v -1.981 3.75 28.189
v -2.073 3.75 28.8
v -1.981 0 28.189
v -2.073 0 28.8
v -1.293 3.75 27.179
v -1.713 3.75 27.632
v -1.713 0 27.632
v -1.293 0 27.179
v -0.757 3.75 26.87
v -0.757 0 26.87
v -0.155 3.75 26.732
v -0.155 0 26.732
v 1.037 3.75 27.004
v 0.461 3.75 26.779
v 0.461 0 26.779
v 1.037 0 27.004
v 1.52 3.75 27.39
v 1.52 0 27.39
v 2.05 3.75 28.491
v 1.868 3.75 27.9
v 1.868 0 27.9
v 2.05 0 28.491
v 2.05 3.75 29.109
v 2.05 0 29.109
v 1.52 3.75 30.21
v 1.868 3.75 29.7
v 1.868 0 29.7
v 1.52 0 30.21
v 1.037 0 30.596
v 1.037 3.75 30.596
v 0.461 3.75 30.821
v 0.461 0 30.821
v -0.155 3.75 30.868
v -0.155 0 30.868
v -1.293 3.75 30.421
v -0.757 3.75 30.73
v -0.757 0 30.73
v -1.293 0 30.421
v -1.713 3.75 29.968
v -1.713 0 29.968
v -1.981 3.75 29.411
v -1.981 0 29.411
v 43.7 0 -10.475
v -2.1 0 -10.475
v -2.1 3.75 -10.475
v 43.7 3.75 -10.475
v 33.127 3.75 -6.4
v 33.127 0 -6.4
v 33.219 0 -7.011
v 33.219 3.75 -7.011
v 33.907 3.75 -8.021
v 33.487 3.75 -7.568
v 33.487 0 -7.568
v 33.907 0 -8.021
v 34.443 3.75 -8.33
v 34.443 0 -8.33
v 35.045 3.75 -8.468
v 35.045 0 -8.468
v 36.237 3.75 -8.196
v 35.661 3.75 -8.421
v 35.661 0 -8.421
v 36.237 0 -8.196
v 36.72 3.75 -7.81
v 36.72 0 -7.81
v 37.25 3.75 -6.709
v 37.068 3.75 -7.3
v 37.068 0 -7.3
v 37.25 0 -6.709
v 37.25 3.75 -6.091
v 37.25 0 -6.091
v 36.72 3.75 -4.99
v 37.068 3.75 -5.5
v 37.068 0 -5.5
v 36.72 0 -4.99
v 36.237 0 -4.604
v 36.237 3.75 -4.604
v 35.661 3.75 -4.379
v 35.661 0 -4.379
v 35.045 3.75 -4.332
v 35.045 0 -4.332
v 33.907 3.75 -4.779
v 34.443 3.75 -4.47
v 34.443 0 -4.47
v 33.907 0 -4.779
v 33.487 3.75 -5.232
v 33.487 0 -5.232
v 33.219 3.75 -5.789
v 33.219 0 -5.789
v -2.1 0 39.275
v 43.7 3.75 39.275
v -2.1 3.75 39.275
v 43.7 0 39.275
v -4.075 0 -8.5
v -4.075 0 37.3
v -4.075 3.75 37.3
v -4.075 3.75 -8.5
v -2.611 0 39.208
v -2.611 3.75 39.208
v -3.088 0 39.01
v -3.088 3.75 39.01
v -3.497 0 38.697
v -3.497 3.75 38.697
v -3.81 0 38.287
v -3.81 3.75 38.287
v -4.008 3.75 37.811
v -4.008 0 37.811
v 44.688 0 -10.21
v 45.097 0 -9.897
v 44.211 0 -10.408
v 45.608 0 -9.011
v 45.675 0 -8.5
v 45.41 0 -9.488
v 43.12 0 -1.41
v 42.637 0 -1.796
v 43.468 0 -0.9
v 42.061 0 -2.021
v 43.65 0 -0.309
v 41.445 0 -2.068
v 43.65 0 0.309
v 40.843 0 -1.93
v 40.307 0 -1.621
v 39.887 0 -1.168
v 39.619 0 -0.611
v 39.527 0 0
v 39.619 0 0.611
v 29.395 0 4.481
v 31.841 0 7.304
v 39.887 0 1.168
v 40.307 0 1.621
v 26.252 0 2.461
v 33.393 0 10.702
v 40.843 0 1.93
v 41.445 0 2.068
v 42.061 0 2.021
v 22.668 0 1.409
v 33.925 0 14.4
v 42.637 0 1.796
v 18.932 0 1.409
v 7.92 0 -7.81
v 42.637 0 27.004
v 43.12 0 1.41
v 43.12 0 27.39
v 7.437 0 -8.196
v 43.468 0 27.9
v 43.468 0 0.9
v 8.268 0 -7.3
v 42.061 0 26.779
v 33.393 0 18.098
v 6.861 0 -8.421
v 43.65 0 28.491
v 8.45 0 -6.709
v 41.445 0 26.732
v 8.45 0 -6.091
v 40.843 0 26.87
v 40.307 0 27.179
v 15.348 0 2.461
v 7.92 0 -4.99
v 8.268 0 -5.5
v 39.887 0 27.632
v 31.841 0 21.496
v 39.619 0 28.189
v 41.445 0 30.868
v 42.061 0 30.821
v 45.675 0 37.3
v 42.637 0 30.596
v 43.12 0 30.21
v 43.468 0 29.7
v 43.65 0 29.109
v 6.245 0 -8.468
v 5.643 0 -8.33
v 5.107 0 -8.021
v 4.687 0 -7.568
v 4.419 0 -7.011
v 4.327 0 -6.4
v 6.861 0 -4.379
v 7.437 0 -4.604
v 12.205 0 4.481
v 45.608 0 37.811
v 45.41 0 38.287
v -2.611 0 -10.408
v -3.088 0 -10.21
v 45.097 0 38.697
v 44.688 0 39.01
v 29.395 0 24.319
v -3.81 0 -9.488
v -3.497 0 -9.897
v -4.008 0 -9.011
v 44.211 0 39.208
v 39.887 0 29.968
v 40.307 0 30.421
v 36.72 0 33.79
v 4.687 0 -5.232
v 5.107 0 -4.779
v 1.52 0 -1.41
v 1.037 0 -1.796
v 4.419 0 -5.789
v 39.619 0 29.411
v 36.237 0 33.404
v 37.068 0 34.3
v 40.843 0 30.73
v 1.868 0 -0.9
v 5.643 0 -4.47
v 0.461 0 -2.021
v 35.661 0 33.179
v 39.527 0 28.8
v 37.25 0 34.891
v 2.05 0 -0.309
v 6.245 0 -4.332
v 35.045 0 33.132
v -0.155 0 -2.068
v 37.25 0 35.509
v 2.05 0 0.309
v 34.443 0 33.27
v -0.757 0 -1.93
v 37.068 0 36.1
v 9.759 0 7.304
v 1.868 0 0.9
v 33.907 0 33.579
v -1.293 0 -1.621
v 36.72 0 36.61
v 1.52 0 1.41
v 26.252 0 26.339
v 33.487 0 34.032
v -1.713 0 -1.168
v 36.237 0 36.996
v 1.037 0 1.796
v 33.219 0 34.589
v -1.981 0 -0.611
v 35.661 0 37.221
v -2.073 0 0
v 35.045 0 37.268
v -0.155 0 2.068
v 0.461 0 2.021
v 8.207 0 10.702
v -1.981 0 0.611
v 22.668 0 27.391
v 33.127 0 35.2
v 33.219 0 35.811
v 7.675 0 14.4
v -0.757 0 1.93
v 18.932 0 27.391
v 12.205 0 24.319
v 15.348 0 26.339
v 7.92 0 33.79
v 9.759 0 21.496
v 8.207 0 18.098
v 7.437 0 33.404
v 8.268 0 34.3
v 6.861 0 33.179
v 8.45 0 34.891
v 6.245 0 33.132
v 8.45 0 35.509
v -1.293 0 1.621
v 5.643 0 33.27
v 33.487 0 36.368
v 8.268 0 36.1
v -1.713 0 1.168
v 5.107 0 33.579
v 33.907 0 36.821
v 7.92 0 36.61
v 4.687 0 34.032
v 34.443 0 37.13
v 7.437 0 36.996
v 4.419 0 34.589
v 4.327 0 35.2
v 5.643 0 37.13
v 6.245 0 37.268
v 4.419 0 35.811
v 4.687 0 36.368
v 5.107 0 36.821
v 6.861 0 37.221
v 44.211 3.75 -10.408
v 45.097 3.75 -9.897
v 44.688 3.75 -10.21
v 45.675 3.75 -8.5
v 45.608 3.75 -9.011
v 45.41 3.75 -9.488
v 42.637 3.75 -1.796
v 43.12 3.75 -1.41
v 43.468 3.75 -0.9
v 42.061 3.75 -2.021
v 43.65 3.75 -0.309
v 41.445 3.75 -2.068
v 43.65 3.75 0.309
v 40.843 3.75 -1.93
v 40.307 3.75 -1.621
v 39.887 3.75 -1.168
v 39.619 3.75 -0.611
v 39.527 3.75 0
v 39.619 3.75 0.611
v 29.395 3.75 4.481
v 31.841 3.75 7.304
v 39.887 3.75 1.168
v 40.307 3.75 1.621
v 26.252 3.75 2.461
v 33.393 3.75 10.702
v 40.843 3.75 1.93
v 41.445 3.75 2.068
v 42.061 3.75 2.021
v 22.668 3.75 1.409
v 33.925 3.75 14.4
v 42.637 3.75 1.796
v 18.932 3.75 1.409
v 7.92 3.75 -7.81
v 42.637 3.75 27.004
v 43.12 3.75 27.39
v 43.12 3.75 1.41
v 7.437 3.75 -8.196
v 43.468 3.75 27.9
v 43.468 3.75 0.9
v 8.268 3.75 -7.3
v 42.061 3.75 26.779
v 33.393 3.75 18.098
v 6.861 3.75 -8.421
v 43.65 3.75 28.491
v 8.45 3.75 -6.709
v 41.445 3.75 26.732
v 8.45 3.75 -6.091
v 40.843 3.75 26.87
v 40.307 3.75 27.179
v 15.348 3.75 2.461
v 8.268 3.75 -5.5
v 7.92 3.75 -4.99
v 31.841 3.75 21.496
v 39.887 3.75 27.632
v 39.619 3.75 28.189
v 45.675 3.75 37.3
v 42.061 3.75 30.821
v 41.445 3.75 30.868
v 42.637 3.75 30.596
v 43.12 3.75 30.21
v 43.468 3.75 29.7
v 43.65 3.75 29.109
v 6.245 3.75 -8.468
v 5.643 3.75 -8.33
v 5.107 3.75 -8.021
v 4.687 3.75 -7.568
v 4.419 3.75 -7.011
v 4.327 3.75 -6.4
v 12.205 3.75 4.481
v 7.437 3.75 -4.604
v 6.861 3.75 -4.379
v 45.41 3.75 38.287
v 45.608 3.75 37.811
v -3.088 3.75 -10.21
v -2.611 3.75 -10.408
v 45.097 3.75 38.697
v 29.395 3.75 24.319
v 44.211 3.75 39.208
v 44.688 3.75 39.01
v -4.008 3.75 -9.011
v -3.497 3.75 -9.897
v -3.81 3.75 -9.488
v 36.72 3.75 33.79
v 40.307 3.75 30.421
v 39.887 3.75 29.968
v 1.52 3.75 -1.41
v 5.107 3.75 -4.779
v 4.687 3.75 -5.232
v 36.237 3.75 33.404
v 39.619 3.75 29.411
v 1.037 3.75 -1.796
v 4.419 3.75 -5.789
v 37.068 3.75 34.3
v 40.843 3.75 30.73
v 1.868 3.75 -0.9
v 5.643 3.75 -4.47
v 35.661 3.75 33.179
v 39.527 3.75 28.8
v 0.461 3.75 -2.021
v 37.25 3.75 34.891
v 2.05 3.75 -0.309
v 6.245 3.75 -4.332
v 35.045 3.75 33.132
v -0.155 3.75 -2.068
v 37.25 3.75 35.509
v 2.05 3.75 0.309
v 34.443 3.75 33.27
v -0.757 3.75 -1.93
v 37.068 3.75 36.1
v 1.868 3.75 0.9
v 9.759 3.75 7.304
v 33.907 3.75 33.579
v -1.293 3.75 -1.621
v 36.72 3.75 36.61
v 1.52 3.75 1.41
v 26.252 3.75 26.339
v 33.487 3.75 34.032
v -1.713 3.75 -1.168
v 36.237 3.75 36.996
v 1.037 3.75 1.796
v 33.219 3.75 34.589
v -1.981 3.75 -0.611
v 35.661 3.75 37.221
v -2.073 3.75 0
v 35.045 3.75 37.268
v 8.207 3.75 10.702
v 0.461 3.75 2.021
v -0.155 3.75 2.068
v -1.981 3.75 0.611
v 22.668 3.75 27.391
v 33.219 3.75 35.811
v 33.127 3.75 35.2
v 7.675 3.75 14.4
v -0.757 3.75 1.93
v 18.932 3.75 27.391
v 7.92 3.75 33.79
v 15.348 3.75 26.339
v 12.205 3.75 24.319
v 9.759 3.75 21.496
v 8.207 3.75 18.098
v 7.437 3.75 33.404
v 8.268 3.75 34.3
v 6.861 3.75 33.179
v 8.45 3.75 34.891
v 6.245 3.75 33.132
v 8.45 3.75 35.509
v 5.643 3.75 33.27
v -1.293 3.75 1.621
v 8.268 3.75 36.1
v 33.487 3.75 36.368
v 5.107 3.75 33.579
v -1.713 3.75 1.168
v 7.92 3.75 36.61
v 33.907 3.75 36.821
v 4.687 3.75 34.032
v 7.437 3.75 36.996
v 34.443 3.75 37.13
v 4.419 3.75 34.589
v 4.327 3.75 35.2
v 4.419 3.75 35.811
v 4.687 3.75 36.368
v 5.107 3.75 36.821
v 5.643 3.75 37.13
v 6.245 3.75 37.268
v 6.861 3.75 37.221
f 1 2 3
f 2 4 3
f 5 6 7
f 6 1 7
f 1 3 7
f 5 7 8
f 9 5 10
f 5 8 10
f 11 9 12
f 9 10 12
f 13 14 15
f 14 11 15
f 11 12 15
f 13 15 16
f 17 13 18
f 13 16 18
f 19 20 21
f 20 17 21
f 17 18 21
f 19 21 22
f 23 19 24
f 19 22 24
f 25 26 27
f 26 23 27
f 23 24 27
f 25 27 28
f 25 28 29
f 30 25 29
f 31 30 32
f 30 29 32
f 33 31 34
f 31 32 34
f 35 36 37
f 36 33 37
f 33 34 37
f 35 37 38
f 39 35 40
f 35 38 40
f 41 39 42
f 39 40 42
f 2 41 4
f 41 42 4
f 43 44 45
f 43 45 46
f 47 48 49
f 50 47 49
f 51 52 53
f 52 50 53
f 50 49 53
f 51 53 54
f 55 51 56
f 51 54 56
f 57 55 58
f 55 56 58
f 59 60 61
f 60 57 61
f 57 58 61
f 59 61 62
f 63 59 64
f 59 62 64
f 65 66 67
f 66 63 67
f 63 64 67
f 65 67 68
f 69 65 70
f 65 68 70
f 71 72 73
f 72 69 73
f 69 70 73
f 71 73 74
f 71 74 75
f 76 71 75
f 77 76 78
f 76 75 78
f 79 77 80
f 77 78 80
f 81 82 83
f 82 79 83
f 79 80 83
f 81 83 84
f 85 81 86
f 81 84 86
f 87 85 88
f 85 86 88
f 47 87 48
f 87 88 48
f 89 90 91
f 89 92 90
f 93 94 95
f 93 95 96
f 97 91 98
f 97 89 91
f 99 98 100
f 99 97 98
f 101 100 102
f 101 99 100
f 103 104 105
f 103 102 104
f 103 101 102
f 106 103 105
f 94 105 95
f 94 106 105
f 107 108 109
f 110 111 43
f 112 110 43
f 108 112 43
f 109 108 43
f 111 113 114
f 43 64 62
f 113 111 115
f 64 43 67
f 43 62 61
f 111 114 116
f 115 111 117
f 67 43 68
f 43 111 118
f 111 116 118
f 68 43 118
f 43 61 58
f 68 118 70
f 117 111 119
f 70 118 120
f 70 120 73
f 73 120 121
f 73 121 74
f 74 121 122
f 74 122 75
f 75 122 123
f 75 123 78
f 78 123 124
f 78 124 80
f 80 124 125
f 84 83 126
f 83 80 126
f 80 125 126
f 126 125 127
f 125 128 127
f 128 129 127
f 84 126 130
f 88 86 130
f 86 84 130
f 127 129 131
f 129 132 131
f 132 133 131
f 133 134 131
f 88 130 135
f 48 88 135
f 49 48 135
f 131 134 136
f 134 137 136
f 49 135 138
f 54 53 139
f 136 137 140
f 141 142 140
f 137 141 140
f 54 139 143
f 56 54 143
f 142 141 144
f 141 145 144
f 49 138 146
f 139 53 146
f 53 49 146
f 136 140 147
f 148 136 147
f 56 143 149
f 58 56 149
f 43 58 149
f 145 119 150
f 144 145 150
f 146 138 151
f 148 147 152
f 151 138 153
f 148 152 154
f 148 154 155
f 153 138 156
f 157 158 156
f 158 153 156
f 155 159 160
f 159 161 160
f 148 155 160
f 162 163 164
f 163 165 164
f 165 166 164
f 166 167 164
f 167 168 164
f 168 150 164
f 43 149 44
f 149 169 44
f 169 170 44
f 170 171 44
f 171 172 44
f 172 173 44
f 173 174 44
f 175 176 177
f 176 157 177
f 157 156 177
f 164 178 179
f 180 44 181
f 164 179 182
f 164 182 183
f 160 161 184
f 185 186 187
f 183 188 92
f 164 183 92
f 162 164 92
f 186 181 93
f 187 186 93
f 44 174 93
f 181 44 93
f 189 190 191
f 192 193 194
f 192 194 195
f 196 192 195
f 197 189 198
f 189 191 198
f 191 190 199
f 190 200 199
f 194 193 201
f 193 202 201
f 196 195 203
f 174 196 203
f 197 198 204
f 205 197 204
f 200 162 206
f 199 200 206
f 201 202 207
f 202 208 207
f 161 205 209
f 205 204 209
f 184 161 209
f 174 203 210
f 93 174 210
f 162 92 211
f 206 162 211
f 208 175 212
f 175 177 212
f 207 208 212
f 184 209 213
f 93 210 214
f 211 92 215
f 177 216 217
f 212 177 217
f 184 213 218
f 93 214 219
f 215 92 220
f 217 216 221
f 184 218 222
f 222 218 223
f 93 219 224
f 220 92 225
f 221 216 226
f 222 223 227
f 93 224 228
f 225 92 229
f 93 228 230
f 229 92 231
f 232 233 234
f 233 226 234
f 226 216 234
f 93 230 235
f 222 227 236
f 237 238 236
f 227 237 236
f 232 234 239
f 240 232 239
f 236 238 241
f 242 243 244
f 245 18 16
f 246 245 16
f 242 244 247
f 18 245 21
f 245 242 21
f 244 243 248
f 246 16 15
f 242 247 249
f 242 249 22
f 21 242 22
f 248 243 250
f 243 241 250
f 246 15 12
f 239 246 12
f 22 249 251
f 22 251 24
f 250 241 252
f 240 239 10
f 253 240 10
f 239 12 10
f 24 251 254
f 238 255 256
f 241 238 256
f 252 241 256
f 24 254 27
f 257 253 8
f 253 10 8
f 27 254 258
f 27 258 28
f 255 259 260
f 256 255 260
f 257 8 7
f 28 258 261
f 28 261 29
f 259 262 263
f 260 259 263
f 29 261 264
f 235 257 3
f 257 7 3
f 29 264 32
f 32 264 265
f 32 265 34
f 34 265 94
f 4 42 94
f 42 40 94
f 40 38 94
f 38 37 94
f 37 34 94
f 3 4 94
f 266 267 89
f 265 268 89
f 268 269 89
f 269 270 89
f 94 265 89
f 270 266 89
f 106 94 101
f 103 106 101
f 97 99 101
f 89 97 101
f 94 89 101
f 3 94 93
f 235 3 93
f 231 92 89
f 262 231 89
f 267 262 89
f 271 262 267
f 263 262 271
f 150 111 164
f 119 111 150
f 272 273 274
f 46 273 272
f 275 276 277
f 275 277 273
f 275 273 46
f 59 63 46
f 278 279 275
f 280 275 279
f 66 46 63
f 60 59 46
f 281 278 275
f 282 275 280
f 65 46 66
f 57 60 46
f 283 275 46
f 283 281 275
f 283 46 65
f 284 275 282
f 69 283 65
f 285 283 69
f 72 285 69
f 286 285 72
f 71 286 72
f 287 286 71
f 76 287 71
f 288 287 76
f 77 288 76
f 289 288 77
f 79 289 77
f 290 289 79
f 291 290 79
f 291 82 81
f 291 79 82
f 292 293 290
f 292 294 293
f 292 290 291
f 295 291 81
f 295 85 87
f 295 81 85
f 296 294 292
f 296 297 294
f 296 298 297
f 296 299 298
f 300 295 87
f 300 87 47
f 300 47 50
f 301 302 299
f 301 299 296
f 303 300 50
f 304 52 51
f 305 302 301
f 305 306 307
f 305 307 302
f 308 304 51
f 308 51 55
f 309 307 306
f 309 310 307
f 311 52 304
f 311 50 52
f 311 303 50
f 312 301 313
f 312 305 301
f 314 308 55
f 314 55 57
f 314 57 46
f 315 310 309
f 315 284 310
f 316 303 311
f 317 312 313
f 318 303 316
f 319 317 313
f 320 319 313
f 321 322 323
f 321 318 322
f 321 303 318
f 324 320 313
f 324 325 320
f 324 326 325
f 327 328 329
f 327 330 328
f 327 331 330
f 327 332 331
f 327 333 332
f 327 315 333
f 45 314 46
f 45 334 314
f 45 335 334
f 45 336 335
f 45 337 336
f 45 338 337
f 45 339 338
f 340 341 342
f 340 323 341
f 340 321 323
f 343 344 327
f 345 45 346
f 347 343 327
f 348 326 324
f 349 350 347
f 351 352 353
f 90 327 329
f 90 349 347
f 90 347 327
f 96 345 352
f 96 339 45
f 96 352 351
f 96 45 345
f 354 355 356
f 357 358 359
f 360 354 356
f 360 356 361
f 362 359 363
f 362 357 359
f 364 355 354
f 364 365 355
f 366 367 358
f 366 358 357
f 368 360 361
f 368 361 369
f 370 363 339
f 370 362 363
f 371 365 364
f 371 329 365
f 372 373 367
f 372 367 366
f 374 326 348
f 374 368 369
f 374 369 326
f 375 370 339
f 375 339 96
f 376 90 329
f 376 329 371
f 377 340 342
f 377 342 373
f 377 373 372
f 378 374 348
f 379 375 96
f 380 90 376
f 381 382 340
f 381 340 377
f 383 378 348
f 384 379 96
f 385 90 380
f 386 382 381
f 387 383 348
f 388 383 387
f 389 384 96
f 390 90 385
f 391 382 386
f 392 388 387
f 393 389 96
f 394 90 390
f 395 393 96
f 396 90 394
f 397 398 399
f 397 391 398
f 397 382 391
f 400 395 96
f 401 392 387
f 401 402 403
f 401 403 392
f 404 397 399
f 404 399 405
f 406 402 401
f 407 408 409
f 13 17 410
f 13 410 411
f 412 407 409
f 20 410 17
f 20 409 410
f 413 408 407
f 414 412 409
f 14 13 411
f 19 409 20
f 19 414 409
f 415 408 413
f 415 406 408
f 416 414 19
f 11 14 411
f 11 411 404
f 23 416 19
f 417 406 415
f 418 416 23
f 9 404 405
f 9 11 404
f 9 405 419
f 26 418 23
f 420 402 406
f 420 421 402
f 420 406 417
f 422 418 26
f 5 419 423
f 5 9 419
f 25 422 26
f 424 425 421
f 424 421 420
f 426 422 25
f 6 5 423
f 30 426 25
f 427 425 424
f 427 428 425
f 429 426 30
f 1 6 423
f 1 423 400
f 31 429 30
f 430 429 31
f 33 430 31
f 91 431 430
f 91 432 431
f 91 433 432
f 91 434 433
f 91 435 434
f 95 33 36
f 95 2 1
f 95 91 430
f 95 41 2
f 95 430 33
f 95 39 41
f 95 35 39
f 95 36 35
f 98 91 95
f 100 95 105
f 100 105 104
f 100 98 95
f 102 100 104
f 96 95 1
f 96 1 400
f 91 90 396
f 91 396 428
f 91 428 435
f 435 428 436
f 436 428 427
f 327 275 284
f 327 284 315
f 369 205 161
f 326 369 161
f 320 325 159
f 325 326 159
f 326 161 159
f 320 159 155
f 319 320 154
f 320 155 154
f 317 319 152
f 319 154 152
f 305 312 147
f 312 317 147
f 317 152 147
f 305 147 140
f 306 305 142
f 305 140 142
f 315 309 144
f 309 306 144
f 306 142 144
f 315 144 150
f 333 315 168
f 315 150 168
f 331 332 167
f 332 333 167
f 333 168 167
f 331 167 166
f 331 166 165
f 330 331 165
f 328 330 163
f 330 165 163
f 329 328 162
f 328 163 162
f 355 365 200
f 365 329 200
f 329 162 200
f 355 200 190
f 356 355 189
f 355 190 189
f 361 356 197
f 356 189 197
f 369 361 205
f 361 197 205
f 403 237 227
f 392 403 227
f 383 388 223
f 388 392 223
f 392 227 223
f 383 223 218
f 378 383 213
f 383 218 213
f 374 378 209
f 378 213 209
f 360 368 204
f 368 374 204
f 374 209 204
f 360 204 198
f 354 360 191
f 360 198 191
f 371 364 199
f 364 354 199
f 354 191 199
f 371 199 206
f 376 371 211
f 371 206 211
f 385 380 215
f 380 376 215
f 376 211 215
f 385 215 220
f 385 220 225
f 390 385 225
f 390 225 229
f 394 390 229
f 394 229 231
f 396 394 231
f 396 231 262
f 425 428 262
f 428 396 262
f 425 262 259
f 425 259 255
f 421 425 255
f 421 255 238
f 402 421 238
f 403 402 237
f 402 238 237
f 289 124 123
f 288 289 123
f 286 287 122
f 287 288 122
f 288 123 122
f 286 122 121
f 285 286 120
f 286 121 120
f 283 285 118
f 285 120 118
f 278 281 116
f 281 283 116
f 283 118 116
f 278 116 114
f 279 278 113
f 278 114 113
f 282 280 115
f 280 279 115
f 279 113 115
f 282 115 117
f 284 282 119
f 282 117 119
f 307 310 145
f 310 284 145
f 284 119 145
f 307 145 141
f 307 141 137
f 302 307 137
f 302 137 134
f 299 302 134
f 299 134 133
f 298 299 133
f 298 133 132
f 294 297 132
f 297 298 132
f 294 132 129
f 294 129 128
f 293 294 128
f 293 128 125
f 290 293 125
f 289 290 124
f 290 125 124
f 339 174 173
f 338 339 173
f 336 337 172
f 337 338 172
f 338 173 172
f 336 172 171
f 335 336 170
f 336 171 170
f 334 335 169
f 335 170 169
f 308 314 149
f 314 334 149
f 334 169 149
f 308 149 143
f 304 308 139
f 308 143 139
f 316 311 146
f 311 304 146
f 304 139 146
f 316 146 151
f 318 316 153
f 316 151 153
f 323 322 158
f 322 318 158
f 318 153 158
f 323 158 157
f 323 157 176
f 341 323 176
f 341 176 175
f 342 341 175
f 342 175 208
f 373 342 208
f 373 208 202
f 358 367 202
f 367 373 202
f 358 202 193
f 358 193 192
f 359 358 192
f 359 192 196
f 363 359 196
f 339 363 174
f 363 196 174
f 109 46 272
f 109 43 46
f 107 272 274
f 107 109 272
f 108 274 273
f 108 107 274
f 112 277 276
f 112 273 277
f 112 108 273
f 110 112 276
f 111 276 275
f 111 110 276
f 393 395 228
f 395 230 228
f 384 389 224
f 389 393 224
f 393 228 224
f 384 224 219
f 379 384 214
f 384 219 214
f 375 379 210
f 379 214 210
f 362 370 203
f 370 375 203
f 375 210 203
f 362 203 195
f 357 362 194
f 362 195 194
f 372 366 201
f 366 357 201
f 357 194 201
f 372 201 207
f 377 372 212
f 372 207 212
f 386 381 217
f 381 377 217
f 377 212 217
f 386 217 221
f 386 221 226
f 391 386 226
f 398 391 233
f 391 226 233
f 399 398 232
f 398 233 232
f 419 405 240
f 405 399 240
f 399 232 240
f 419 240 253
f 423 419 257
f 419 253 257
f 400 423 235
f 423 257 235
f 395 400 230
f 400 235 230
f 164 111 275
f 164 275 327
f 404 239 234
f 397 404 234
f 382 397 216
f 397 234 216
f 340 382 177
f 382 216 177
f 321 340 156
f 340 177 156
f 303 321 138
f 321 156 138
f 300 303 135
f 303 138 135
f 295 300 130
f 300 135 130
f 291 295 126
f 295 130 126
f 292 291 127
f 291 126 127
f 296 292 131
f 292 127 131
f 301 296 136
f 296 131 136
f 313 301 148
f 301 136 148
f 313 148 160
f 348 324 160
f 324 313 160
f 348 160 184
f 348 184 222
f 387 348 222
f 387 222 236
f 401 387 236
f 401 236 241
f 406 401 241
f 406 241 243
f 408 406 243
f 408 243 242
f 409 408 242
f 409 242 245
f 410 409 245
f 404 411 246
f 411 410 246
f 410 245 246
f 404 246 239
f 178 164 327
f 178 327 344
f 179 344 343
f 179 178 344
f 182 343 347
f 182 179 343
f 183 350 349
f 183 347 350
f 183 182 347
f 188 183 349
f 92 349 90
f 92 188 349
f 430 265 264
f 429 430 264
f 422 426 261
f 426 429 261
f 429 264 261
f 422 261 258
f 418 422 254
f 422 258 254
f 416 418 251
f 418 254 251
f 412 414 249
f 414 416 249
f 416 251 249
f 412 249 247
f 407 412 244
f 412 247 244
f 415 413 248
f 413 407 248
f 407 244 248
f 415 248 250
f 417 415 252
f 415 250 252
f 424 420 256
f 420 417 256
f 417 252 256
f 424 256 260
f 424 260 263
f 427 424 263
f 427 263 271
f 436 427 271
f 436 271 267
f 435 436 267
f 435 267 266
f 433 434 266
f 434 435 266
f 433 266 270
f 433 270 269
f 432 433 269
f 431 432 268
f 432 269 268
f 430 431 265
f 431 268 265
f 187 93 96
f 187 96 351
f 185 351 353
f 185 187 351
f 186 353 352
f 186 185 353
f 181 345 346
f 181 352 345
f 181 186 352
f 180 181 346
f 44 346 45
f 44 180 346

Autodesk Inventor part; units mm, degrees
ref_plane "YZ Plane" through (0, 0, 0) normal (1, 0, 0) x (0, 1, 0)
ref_plane "XZ Plane" through (0, 0, 0) normal (0, 1, 0) x (-1, 0, 0)
ref_plane "XY Plane" through (0, 0, 0) normal (0, 0, 1) x (1, 0, 0)
sketch "Sketch1" plane through (0, 0, 0) normal (0, 1, 0) x (-1, 0, 0)
  circle A0 centre (-20.8, 14.4) radius 13.125
  circle A1 centre (-42.7, -7.5) radius 1.875 projected
  circle A2 centre (1.1, 36.3) radius 1.875 projected
  circle A3 centre (1.1, -7.5) radius 1.875 projected
  circle A4 centre (-42.7, 36.3) radius 1.875 projected
  circle A5 centre (-6.4, 35.2) radius 2.0734 projected
  circle A6 centre (-35.2, -6.4) radius 2.0734 projected
  circle A7 centre (-6.4, -6.4) radius 2.0734 projected
  circle A8 centre (0, 0) radius 2.0734 projected
  line L0 (-37.85, 31.45) -> (-37.85, -2.65) projected
  line L1 (-3.75, 31.45) -> (-37.85, 31.45) projected
  line L2 (-3.75, -2.65) -> (-3.75, 31.45) projected
  line L3 (-37.85, -2.65) -> (-3.75, -2.65) projected
  circle A9 centre (0, 28.8) radius 2.0734 projected
  circle A10 centre (-35.2, 35.2) radius 2.0734 projected
  circle A11 centre (-41.6, 0) radius 2.0734 projected
  circle A12 centre (-41.6, 28.8) radius 2.0734 projected
  line L4 (-43.7, 39.275) -> (2.1, 39.275) projected
  arc A13 (-43.7, 39.275) -> (-45.675, 37.3) centre (-43.7, 37.3) ccw projected
  line L5 (-45.675, -8.5) -> (-45.675, 37.3) projected
  arc A14 (-45.675, -8.5) -> (-43.7, -10.475) centre (-43.7, -8.5) ccw projected
  line L6 (2.1, -10.475) -> (-43.7, -10.475) projected
  arc A15 (2.1, -10.475) -> (4.075, -8.5) centre (2.1, -8.5) ccw projected
  line L7 (4.075, 37.3) -> (4.075, -8.5) projected
  arc A16 (4.075, 37.3) -> (2.1, 39.275) centre (2.1, 37.3) ccw projected
  line L8 (-3.75, 14.4) -> (-37.85, 14.4)
  dimension "d36" = 26.25
extrude "Extrusion1" add sketch "Sketch1" along normal blind 3.75 contours L8 L2 L3 L0 A0 | A0 L8 L0 L1 L2 | A1 | A2 | A3 | A4 | L4 A16 L7 A15 L6 A14 L5 A13
properties part number "Camera Mount Top"
